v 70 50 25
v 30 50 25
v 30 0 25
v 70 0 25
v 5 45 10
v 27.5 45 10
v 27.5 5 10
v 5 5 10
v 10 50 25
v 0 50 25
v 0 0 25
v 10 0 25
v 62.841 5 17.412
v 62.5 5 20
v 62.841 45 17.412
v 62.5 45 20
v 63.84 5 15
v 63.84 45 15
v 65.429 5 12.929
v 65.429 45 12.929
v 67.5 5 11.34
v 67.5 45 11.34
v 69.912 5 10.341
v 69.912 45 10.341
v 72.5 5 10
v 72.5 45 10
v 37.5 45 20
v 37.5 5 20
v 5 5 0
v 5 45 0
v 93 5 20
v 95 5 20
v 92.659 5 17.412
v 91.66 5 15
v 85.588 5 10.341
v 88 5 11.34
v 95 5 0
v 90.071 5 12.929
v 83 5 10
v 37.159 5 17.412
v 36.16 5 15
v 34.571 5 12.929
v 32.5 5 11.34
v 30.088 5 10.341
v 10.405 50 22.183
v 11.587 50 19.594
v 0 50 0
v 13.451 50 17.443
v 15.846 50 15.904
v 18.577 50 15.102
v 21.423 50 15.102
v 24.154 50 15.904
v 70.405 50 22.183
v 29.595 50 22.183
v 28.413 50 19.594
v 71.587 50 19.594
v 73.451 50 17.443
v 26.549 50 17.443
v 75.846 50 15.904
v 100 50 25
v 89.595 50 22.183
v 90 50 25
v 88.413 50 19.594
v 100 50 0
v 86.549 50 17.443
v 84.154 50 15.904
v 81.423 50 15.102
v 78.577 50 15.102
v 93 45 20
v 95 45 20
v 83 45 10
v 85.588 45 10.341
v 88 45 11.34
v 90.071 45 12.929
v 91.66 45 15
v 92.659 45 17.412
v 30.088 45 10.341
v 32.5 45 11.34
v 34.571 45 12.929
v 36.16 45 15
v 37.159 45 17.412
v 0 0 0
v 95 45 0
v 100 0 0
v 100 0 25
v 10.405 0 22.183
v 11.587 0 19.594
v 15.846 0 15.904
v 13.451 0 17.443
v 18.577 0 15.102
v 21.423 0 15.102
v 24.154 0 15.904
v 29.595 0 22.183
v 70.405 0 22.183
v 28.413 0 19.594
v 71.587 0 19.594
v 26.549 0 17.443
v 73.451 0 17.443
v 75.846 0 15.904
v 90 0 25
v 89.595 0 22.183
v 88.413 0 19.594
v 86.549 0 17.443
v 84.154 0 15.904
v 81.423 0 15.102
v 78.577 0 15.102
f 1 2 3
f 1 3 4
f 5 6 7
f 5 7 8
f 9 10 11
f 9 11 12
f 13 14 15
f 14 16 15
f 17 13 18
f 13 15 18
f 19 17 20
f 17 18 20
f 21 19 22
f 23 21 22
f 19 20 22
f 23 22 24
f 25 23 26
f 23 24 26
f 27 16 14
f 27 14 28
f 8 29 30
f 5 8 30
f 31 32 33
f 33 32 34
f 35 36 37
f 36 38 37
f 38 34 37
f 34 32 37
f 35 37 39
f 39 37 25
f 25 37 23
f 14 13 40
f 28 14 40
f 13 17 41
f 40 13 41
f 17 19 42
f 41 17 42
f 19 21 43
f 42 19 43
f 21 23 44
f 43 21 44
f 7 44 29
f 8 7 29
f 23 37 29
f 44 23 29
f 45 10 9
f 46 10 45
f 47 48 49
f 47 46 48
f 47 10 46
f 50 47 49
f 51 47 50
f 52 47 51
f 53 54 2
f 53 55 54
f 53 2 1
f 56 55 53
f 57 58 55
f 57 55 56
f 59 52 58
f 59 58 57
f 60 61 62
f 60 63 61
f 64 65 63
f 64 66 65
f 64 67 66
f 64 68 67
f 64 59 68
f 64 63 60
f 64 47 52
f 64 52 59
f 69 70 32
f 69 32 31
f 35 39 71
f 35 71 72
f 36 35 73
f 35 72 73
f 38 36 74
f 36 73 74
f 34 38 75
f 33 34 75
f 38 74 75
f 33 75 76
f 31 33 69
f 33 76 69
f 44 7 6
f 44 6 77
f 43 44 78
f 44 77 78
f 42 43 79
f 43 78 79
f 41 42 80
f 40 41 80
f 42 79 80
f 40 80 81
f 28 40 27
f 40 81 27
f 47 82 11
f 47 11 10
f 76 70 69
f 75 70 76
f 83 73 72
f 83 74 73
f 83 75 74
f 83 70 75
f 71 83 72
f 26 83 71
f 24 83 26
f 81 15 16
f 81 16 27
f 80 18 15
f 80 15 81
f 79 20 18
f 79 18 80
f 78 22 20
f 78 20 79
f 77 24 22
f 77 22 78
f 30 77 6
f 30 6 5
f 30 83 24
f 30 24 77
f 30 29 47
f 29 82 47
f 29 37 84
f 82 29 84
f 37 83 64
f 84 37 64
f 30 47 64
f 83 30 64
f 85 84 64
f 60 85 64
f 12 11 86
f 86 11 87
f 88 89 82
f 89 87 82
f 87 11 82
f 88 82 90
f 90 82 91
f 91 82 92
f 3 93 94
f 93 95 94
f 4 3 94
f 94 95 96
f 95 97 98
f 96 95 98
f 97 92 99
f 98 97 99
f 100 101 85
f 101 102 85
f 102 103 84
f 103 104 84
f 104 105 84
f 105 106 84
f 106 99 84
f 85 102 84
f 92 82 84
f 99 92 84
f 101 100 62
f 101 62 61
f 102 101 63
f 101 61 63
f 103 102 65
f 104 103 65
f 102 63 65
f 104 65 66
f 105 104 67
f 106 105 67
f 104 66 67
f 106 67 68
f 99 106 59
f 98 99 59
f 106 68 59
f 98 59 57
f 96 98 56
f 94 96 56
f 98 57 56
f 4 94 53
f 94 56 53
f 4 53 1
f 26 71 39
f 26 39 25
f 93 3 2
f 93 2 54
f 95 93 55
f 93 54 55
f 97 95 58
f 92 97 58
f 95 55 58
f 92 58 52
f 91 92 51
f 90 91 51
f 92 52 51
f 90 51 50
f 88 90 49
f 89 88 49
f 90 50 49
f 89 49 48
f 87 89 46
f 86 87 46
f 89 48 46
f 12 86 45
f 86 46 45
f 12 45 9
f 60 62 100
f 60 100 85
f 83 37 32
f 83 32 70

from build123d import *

# Parameters (mm, degrees)
SKIZZE1_W                       = 100
SKIZZE1_H                       = 50
AUFSATZ_LINEAR_AUSTRAGEN2_DEPTH = 25
SKIZZE4_R                       = 10
SCHNITT_LINEAR_AUSTRAGEN3_DEPTH = 115.564392374
SKIZZE5_W                       = 90
SKIZZE5_H                       = 40
SCHNITT_LINEAR_AUSTRAGEN4_DEPTH = 10
SKIZZE7_W                       = 25
SKIZZE7_H                       = 40
SCHNITT_LINEAR_AUSTRAGEN5_DEPTH = 10
VERRUNDUNG1_R                   = 10
VERRUNDUNG2_R                   = 10
SKIZZE8_W                       = 2
SKIZZE8_H                       = 40
SCHNITT_LINEAR_AUSTRAGEN6_DEPTH = 10
VERRUNDUNG3_R                   = 10


with BuildPart() as part:
    # Skizze1 → Aufsatz-Linear austragen2 (new body)
    with BuildSketch(Plane.XY):
        with Locations((50, 25)):
            Rectangle(SKIZZE1_W, SKIZZE1_H)
    extrude(amount=AUFSATZ_LINEAR_AUSTRAGEN2_DEPTH)

    # Skizze4 → Schnitt-Linear austragen3 (cut, through all)
    with BuildSketch(Plane(origin=(0, 50, 0), x_dir=(1, 0, 0), z_dir=(0, 1, 0))):
        with Locations((20, -25)):
            Circle(SKIZZE4_R)
        with Locations((80, -25)):
            Circle(SKIZZE4_R)
    extrude(amount=-SCHNITT_LINEAR_AUSTRAGEN3_DEPTH, mode=Mode.SUBTRACT)

    # Skizze5 → Schnitt-Linear austragen4 (cut)
    with BuildSketch(Plane(origin=(0, 0, 0), x_dir=(-1, 0, 0), z_dir=(0, 0, -1))):
        with Locations((-50, 25)):
            Rectangle(SKIZZE5_W, SKIZZE5_H)
    extrude(amount=-SCHNITT_LINEAR_AUSTRAGEN4_DEPTH, mode=Mode.SUBTRACT)

    # Skizze7 → Schnitt-Linear austragen5 (cut)
    with BuildSketch(Plane(origin=(0, 0, 10), x_dir=(-1, 0, 0), z_dir=(0, 0, -1))):
        with Locations((-50, 25)):
            Rectangle(SKIZZE7_W, SKIZZE7_H)
    extrude(amount=-SCHNITT_LINEAR_AUSTRAGEN5_DEPTH, mode=Mode.SUBTRACT)

    # Verrundung1
    verrundung1_edges = [part.edges().sort_by_distance(p)[0] for p in [
        (37.5, 25, 10),
    ]]
    fillet(verrundung1_edges, radius=VERRUNDUNG1_R - 0.0001)  # a hair under: the kernel refuses the full size

    # Verrundung2
    verrundung2_edges = [part.edges().sort_by_distance(p)[0] for p in [
        (62.5, 25, 10),
    ]]
    fillet(verrundung2_edges, radius=VERRUNDUNG2_R - 0.0001)  # a hair under: the kernel refuses the full size

    # Skizze8 → Schnitt-Linear austragen6 (cut)
    with BuildSketch(Plane(origin=(0, 0, 10), x_dir=(-1, 0, 0), z_dir=(0, 0, -1))):
        with Locations((-94, 25)):
            Rectangle(SKIZZE8_W, SKIZZE8_H)
    extrude(amount=-SCHNITT_LINEAR_AUSTRAGEN6_DEPTH, mode=Mode.SUBTRACT)

    # Verrundung3
    verrundung3_edges = [part.edges().sort_by_distance(p)[0] for p in [
        (93, 25, 10),
    ]]
    fillet(verrundung3_edges, radius=VERRUNDUNG3_R - 0.0001)  # a hair under: the kernel refuses the full size


solid = part.part
